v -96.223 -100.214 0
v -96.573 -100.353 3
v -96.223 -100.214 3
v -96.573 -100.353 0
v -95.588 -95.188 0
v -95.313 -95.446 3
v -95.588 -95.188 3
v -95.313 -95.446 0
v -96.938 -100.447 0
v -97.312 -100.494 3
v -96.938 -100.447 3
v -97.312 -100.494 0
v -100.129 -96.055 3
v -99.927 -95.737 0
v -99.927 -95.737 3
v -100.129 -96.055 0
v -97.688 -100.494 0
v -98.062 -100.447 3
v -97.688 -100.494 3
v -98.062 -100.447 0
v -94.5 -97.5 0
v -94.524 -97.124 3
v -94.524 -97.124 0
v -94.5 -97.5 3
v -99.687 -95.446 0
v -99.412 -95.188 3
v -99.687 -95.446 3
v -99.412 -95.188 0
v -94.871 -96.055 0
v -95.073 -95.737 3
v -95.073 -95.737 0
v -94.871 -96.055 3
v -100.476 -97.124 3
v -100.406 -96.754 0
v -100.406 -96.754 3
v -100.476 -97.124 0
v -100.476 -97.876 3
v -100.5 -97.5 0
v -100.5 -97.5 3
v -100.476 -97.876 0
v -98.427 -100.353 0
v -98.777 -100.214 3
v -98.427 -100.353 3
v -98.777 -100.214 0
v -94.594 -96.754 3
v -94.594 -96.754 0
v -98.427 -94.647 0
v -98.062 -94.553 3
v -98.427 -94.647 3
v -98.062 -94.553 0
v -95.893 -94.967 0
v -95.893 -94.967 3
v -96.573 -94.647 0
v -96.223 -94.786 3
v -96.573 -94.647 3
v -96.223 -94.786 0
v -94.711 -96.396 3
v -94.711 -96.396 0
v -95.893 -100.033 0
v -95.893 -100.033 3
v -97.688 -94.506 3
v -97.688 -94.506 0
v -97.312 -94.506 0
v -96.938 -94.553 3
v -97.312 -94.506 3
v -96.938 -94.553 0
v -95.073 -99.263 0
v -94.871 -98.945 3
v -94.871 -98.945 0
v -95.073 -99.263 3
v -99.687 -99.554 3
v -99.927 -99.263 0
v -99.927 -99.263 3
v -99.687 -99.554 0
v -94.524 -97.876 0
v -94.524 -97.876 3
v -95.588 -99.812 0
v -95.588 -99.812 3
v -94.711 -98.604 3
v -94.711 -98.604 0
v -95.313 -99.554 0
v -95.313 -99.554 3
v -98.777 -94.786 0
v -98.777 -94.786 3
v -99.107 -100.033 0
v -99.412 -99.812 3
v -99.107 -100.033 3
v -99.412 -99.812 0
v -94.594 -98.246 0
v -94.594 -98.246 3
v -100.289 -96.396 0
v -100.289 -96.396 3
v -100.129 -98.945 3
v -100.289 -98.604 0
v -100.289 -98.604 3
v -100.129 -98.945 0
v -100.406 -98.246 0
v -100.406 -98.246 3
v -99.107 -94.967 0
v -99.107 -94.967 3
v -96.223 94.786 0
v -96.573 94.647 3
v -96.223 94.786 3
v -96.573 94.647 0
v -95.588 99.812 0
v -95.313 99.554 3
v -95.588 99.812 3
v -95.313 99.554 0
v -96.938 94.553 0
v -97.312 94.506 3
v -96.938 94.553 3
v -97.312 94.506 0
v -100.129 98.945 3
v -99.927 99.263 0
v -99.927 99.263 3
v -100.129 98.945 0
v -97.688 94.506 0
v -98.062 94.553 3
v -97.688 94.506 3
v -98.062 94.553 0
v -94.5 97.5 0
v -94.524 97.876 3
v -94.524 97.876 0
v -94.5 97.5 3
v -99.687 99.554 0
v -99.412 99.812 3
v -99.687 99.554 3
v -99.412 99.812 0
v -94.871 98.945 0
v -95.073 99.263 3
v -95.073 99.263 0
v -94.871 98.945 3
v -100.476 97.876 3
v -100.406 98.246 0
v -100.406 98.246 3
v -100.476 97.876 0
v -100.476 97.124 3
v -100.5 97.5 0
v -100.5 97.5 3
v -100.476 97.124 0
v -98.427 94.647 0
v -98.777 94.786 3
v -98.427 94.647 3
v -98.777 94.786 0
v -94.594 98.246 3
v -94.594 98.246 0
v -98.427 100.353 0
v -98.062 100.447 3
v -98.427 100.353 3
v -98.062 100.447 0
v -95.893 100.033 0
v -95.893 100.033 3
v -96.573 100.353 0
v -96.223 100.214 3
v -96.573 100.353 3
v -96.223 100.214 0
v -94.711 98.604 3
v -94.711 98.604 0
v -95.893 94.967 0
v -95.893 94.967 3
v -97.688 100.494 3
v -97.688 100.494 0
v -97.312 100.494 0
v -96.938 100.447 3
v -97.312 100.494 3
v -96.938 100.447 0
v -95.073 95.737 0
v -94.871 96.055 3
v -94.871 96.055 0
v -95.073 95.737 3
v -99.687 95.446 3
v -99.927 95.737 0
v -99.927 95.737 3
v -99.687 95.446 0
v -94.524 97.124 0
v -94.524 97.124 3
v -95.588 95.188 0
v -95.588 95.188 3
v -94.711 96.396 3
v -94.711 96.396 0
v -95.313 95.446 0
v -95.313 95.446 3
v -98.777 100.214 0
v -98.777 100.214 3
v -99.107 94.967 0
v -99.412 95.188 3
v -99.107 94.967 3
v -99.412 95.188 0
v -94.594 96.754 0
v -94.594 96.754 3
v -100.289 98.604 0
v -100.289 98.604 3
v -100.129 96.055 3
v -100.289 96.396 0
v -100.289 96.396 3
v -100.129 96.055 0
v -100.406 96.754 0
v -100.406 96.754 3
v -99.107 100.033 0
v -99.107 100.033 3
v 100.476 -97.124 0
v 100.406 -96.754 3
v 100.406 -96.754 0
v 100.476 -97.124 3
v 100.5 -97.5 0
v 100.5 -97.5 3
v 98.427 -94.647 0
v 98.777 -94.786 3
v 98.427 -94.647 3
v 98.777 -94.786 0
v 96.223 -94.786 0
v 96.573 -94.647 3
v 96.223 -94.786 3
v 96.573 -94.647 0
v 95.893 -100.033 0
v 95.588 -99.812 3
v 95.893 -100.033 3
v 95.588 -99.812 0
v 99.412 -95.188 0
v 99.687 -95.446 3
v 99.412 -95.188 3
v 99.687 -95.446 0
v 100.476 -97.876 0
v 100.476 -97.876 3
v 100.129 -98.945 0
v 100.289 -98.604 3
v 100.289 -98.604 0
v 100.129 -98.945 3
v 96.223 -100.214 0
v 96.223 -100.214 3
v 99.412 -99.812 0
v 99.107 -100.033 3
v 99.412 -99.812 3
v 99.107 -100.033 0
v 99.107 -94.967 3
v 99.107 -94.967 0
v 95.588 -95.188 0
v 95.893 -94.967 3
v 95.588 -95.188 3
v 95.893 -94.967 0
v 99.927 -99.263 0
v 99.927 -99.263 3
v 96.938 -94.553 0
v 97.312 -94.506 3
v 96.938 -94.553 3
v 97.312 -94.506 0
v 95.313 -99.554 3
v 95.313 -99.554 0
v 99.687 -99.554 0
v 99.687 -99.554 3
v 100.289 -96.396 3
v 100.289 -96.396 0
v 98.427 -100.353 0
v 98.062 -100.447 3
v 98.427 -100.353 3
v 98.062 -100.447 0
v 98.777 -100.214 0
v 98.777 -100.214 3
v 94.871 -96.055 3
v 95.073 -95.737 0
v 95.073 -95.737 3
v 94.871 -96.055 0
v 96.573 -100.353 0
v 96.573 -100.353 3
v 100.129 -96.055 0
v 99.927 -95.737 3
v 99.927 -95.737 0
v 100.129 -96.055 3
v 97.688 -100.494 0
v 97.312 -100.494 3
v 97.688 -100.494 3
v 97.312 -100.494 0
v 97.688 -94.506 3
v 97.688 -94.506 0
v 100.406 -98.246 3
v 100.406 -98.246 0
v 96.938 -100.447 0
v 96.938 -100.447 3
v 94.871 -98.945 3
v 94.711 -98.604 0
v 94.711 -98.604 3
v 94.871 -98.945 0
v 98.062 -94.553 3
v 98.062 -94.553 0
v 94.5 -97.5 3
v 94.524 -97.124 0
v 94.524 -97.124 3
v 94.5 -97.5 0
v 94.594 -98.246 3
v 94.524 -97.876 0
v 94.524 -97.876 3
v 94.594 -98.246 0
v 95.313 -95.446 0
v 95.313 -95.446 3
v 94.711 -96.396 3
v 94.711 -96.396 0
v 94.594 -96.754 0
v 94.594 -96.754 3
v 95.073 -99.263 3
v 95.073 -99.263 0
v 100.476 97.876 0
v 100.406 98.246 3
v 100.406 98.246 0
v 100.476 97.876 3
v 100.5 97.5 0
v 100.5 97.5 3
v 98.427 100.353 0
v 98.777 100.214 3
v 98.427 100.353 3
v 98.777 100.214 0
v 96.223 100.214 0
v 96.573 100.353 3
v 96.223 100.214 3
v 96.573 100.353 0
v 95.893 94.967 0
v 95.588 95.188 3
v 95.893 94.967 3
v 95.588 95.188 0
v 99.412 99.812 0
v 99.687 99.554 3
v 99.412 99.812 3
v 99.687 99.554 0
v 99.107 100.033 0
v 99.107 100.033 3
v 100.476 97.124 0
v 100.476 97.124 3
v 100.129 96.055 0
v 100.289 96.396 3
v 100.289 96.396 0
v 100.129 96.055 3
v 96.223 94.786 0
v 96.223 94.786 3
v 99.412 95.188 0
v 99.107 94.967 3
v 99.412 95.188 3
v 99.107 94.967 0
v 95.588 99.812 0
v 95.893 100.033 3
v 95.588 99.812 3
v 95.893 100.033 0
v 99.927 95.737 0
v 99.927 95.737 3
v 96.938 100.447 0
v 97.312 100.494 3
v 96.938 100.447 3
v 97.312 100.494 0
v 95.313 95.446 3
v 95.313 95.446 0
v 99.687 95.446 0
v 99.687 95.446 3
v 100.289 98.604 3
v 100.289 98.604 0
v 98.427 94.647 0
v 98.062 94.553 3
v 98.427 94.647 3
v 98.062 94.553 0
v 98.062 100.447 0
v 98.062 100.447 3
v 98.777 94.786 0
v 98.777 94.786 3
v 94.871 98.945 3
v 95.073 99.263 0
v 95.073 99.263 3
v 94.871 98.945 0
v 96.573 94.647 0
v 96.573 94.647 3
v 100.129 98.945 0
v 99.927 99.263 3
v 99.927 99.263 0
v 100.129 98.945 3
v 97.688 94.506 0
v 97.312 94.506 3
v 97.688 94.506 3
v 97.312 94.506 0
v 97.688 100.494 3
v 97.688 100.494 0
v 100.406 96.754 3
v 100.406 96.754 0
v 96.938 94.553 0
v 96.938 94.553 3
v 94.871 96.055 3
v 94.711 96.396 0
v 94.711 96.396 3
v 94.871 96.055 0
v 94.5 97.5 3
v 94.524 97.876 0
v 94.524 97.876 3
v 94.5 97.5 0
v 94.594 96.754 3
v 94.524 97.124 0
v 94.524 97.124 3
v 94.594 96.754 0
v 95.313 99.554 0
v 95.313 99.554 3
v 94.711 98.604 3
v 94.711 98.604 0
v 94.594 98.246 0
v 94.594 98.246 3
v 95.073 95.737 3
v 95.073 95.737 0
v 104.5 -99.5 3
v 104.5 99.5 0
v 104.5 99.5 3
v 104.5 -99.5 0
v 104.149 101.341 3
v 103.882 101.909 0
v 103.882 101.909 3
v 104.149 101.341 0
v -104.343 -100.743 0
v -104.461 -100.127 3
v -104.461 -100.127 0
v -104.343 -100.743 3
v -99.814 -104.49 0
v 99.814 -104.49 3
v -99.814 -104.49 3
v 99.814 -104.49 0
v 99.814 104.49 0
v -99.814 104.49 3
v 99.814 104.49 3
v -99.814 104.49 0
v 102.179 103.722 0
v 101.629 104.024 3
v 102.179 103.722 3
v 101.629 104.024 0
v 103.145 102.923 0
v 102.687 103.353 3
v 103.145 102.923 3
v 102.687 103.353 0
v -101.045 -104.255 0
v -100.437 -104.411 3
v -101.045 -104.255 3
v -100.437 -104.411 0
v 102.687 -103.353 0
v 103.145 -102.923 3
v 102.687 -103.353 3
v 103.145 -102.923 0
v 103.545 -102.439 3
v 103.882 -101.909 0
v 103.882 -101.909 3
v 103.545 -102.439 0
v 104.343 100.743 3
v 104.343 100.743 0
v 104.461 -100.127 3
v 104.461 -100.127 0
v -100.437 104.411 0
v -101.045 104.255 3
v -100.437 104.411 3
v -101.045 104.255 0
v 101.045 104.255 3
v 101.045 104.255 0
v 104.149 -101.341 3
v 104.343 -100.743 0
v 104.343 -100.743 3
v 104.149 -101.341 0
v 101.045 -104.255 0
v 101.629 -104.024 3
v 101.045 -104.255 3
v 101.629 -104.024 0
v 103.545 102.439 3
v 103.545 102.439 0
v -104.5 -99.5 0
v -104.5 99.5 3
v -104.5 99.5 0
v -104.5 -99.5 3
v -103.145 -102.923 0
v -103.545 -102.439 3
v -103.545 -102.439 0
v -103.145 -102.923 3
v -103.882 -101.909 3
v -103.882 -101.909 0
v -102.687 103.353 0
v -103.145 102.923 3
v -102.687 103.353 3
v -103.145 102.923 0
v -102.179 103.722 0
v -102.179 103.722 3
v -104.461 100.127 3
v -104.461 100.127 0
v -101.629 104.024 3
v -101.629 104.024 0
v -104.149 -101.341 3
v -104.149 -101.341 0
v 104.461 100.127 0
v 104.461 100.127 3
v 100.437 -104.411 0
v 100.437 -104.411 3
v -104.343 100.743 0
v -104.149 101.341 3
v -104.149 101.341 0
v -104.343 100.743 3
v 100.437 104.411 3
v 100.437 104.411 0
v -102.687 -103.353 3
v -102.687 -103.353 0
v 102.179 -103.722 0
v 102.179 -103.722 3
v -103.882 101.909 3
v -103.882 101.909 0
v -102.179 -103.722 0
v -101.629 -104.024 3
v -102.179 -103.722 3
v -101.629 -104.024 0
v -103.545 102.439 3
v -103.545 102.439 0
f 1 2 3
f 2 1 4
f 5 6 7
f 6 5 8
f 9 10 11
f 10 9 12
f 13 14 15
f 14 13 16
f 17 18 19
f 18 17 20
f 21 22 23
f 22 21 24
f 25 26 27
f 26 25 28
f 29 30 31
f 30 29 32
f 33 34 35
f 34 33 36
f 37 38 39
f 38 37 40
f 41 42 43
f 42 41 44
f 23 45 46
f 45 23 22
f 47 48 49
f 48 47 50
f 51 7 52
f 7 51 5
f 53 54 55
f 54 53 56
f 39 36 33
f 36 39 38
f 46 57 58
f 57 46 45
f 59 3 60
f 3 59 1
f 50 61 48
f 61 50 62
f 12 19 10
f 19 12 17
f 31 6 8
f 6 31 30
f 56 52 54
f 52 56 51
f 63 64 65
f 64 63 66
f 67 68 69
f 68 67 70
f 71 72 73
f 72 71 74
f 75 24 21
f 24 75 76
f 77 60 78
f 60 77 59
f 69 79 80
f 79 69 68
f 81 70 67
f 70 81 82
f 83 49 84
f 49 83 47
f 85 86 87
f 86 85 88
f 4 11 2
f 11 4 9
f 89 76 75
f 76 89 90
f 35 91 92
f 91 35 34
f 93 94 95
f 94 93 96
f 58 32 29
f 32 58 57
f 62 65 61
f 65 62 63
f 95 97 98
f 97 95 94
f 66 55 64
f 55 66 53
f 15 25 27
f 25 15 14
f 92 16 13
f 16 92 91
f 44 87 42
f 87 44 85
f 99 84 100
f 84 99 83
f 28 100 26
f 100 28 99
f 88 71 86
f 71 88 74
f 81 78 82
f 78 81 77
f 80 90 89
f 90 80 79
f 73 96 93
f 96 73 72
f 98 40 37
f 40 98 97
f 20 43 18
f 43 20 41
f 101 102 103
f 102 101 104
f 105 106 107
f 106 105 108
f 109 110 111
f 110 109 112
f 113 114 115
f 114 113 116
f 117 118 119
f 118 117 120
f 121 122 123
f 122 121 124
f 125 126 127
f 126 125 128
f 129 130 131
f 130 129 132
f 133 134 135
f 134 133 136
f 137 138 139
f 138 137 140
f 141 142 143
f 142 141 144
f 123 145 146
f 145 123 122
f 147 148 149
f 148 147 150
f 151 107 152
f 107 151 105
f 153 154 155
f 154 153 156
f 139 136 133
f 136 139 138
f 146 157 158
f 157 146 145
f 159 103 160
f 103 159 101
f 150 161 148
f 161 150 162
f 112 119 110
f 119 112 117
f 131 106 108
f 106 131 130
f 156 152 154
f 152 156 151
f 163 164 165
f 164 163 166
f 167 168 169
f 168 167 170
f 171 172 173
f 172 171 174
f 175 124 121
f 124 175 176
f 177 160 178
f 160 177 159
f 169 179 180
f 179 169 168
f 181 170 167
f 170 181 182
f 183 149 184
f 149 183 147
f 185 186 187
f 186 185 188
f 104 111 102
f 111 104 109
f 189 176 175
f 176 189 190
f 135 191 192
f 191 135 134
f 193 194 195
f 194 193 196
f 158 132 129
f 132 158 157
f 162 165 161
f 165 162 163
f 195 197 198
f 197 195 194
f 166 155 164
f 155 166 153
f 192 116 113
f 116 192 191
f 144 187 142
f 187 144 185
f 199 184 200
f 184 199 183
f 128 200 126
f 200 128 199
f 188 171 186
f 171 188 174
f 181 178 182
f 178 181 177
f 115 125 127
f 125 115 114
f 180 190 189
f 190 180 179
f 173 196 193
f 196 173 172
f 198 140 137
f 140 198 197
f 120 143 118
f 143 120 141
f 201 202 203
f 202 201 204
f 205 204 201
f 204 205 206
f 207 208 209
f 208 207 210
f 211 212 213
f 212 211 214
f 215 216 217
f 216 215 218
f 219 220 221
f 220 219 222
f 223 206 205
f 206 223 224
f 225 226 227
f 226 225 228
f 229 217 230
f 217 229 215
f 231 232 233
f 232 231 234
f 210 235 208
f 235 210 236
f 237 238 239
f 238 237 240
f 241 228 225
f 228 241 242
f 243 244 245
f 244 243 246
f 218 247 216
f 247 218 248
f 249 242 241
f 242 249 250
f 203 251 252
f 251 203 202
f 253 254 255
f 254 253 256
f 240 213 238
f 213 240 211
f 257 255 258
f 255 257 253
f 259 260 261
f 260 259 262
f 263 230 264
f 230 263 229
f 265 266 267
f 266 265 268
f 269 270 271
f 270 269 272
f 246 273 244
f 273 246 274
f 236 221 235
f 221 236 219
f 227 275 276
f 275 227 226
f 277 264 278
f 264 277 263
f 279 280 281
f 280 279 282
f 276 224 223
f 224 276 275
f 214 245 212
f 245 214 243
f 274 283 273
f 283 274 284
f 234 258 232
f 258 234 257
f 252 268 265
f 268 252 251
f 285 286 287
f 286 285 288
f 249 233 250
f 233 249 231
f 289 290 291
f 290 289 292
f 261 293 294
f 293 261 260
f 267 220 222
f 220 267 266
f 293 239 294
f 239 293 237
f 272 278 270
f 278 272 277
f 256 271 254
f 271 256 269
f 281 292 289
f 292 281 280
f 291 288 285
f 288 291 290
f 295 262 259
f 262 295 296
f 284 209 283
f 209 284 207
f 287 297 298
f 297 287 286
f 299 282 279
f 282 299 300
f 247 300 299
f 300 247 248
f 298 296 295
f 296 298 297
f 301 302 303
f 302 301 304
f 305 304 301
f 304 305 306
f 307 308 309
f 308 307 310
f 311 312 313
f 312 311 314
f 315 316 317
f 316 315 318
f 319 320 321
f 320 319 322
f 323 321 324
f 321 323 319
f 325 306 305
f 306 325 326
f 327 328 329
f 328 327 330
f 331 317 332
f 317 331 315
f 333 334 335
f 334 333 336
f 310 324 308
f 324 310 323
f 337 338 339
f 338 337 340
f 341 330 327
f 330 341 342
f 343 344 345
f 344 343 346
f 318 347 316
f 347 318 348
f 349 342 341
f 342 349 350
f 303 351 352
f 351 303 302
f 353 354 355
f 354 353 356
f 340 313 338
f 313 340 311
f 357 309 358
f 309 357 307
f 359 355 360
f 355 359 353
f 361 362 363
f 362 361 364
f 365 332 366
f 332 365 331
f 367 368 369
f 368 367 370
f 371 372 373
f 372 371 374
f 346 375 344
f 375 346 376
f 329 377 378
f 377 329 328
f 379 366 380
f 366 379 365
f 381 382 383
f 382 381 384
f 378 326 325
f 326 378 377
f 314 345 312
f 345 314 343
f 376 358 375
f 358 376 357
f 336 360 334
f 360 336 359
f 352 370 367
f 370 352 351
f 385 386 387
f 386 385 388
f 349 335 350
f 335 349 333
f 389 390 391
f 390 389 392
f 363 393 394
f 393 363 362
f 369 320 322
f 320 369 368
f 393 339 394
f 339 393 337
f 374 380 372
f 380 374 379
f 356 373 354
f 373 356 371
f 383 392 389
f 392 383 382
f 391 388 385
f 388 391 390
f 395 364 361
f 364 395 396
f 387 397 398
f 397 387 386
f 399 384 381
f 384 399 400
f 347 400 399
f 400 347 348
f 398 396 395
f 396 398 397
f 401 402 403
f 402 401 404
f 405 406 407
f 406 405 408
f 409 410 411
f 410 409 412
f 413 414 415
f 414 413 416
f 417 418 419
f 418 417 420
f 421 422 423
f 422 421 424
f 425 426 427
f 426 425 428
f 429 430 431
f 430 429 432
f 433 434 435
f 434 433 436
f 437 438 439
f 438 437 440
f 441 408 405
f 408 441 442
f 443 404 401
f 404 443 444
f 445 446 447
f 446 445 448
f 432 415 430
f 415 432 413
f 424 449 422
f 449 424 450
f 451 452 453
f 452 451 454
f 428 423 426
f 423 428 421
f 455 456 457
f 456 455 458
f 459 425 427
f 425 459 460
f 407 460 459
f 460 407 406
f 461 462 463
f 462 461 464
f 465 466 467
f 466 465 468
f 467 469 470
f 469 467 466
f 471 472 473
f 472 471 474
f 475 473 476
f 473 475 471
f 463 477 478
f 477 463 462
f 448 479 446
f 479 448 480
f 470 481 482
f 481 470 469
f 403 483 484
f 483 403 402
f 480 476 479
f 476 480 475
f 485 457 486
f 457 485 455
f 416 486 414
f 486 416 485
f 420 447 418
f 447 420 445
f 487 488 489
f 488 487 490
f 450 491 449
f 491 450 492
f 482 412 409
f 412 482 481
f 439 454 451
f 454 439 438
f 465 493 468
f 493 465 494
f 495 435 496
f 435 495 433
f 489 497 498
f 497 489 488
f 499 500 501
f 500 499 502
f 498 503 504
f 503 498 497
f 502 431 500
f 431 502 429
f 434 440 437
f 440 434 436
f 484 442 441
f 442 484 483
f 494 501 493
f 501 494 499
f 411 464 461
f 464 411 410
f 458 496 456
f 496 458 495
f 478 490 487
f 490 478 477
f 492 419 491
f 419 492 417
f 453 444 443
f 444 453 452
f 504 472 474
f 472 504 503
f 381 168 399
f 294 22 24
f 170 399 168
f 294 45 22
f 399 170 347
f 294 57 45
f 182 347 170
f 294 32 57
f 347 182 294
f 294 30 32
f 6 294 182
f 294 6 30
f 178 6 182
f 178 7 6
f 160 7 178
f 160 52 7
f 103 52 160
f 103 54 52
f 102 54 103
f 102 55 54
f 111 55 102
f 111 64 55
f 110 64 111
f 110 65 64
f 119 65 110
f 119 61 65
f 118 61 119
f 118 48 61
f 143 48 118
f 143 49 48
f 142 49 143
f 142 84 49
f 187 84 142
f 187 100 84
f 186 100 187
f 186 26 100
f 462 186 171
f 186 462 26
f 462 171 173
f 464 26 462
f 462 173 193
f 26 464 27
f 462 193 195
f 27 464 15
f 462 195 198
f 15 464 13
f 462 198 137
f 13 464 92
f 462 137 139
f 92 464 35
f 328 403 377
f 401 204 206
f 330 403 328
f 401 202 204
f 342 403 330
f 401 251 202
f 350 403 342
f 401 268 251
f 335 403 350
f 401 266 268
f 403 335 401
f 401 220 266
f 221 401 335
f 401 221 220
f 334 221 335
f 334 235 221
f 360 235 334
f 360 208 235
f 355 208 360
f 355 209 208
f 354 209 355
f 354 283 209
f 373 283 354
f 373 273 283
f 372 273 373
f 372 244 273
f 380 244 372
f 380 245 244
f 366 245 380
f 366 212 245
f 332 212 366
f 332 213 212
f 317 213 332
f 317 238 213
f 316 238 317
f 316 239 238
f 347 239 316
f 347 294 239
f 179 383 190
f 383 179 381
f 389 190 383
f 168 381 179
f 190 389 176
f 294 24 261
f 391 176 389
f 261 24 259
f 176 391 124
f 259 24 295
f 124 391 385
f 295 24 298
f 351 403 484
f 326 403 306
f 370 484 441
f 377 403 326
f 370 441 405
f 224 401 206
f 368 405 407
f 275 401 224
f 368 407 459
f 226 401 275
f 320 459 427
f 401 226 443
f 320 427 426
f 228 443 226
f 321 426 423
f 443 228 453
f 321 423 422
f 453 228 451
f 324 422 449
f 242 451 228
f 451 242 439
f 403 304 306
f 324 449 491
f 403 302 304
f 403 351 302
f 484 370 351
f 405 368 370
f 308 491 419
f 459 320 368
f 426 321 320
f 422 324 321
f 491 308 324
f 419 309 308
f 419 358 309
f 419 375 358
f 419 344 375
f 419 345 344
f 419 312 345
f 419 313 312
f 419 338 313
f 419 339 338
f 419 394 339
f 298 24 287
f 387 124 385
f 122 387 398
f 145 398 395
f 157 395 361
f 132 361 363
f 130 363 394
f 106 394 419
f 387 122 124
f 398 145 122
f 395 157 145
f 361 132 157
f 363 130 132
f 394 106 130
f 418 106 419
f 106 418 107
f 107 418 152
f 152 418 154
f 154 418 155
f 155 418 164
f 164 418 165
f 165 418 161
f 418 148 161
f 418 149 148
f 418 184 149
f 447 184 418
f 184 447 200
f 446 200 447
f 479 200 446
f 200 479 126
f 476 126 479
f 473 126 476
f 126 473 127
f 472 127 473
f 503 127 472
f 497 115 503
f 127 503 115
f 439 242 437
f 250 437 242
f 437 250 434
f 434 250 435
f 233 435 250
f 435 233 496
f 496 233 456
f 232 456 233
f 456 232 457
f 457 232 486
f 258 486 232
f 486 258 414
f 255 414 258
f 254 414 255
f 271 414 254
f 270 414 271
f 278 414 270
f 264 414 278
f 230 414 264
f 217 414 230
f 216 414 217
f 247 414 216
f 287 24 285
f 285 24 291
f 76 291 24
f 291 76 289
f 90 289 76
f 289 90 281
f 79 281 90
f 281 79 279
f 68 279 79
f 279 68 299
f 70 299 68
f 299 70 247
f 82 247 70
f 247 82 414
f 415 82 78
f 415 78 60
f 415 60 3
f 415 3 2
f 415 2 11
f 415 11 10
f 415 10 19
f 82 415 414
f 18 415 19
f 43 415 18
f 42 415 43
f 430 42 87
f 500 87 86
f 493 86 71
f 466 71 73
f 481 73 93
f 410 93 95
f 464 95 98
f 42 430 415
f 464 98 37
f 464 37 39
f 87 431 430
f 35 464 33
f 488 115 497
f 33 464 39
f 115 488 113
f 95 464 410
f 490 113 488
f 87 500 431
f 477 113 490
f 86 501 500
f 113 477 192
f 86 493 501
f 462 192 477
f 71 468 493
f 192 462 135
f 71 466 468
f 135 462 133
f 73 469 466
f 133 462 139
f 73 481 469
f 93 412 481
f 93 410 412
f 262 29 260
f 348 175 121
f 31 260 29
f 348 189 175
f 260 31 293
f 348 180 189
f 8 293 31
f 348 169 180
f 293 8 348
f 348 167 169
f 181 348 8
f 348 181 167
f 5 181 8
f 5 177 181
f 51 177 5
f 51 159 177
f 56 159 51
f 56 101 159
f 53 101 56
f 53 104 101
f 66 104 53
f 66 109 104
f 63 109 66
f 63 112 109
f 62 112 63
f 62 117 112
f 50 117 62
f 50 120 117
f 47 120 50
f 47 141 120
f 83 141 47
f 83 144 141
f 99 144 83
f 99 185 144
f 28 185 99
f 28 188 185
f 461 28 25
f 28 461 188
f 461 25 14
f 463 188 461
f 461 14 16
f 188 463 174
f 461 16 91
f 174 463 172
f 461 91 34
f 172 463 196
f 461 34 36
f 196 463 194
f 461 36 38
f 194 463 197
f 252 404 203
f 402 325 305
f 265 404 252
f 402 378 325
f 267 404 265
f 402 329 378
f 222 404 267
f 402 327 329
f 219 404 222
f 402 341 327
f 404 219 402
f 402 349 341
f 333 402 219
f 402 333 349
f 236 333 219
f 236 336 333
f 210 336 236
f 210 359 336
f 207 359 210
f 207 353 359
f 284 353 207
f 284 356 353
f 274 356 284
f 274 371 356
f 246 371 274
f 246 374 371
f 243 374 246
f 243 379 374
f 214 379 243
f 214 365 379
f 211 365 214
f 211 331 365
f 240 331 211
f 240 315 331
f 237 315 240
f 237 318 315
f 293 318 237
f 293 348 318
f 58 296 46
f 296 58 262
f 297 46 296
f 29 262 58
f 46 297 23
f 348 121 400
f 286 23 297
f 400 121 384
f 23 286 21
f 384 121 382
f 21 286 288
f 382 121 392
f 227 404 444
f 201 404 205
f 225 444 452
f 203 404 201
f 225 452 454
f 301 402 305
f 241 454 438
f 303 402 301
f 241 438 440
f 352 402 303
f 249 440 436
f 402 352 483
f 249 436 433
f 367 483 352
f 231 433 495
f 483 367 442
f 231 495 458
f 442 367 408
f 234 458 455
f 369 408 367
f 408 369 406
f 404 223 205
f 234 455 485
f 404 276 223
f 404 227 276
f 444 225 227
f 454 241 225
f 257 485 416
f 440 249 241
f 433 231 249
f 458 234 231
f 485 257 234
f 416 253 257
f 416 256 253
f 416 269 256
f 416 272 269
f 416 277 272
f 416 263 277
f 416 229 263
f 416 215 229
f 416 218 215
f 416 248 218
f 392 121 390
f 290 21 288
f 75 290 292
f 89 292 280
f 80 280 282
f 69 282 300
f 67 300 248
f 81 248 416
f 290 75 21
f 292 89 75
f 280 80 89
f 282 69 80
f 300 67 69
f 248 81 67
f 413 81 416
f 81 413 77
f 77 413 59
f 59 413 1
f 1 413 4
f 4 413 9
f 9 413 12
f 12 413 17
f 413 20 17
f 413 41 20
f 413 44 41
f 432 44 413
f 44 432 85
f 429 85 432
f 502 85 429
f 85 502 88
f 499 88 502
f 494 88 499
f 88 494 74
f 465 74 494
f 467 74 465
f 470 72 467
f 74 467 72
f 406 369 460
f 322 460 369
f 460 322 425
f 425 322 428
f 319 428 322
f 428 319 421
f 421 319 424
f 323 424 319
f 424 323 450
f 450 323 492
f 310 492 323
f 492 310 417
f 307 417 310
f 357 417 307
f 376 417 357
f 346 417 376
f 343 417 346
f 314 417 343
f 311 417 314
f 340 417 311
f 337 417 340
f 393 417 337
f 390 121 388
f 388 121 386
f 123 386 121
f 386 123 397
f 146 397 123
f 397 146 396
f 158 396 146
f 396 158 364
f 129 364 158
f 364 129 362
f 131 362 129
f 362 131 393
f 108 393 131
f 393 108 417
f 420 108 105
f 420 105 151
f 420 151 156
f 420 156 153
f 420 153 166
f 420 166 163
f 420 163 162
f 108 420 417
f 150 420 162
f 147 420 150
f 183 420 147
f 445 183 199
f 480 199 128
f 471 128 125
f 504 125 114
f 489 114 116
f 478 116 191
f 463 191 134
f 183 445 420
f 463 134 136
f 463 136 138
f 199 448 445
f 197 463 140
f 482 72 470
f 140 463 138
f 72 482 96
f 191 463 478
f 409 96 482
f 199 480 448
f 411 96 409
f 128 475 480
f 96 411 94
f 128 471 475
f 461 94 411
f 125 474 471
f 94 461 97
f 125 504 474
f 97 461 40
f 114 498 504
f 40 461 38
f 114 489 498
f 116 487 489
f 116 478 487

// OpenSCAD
$fn = 50;


difference() {
	union() {
		hull() {
			translate(v = [-99.5000000000, 99.5000000000, 0]) {
				cylinder(h = 3, r = 5);
			}
			translate(v = [99.5000000000, 99.5000000000, 0]) {
				cylinder(h = 3, r = 5);
			}
			translate(v = [-99.5000000000, -99.5000000000, 0]) {
				cylinder(h = 3, r = 5);
			}
			translate(v = [99.5000000000, -99.5000000000, 0]) {
				cylinder(h = 3, r = 5);
			}
		}
	}
	union() {
		translate(v = [-97.5000000000, -97.5000000000, -100.0000000000]) {
			cylinder(h = 200, r = 3.0000000000);
		}
		translate(v = [-97.5000000000, 97.5000000000, -100.0000000000]) {
			cylinder(h = 200, r = 3.0000000000);
		}
		translate(v = [97.5000000000, -97.5000000000, -100.0000000000]) {
			cylinder(h = 200, r = 3.0000000000);
		}
		translate(v = [97.5000000000, 97.5000000000, -100.0000000000]) {
			cylinder(h = 200, r = 3.0000000000);
		}
	}
}
